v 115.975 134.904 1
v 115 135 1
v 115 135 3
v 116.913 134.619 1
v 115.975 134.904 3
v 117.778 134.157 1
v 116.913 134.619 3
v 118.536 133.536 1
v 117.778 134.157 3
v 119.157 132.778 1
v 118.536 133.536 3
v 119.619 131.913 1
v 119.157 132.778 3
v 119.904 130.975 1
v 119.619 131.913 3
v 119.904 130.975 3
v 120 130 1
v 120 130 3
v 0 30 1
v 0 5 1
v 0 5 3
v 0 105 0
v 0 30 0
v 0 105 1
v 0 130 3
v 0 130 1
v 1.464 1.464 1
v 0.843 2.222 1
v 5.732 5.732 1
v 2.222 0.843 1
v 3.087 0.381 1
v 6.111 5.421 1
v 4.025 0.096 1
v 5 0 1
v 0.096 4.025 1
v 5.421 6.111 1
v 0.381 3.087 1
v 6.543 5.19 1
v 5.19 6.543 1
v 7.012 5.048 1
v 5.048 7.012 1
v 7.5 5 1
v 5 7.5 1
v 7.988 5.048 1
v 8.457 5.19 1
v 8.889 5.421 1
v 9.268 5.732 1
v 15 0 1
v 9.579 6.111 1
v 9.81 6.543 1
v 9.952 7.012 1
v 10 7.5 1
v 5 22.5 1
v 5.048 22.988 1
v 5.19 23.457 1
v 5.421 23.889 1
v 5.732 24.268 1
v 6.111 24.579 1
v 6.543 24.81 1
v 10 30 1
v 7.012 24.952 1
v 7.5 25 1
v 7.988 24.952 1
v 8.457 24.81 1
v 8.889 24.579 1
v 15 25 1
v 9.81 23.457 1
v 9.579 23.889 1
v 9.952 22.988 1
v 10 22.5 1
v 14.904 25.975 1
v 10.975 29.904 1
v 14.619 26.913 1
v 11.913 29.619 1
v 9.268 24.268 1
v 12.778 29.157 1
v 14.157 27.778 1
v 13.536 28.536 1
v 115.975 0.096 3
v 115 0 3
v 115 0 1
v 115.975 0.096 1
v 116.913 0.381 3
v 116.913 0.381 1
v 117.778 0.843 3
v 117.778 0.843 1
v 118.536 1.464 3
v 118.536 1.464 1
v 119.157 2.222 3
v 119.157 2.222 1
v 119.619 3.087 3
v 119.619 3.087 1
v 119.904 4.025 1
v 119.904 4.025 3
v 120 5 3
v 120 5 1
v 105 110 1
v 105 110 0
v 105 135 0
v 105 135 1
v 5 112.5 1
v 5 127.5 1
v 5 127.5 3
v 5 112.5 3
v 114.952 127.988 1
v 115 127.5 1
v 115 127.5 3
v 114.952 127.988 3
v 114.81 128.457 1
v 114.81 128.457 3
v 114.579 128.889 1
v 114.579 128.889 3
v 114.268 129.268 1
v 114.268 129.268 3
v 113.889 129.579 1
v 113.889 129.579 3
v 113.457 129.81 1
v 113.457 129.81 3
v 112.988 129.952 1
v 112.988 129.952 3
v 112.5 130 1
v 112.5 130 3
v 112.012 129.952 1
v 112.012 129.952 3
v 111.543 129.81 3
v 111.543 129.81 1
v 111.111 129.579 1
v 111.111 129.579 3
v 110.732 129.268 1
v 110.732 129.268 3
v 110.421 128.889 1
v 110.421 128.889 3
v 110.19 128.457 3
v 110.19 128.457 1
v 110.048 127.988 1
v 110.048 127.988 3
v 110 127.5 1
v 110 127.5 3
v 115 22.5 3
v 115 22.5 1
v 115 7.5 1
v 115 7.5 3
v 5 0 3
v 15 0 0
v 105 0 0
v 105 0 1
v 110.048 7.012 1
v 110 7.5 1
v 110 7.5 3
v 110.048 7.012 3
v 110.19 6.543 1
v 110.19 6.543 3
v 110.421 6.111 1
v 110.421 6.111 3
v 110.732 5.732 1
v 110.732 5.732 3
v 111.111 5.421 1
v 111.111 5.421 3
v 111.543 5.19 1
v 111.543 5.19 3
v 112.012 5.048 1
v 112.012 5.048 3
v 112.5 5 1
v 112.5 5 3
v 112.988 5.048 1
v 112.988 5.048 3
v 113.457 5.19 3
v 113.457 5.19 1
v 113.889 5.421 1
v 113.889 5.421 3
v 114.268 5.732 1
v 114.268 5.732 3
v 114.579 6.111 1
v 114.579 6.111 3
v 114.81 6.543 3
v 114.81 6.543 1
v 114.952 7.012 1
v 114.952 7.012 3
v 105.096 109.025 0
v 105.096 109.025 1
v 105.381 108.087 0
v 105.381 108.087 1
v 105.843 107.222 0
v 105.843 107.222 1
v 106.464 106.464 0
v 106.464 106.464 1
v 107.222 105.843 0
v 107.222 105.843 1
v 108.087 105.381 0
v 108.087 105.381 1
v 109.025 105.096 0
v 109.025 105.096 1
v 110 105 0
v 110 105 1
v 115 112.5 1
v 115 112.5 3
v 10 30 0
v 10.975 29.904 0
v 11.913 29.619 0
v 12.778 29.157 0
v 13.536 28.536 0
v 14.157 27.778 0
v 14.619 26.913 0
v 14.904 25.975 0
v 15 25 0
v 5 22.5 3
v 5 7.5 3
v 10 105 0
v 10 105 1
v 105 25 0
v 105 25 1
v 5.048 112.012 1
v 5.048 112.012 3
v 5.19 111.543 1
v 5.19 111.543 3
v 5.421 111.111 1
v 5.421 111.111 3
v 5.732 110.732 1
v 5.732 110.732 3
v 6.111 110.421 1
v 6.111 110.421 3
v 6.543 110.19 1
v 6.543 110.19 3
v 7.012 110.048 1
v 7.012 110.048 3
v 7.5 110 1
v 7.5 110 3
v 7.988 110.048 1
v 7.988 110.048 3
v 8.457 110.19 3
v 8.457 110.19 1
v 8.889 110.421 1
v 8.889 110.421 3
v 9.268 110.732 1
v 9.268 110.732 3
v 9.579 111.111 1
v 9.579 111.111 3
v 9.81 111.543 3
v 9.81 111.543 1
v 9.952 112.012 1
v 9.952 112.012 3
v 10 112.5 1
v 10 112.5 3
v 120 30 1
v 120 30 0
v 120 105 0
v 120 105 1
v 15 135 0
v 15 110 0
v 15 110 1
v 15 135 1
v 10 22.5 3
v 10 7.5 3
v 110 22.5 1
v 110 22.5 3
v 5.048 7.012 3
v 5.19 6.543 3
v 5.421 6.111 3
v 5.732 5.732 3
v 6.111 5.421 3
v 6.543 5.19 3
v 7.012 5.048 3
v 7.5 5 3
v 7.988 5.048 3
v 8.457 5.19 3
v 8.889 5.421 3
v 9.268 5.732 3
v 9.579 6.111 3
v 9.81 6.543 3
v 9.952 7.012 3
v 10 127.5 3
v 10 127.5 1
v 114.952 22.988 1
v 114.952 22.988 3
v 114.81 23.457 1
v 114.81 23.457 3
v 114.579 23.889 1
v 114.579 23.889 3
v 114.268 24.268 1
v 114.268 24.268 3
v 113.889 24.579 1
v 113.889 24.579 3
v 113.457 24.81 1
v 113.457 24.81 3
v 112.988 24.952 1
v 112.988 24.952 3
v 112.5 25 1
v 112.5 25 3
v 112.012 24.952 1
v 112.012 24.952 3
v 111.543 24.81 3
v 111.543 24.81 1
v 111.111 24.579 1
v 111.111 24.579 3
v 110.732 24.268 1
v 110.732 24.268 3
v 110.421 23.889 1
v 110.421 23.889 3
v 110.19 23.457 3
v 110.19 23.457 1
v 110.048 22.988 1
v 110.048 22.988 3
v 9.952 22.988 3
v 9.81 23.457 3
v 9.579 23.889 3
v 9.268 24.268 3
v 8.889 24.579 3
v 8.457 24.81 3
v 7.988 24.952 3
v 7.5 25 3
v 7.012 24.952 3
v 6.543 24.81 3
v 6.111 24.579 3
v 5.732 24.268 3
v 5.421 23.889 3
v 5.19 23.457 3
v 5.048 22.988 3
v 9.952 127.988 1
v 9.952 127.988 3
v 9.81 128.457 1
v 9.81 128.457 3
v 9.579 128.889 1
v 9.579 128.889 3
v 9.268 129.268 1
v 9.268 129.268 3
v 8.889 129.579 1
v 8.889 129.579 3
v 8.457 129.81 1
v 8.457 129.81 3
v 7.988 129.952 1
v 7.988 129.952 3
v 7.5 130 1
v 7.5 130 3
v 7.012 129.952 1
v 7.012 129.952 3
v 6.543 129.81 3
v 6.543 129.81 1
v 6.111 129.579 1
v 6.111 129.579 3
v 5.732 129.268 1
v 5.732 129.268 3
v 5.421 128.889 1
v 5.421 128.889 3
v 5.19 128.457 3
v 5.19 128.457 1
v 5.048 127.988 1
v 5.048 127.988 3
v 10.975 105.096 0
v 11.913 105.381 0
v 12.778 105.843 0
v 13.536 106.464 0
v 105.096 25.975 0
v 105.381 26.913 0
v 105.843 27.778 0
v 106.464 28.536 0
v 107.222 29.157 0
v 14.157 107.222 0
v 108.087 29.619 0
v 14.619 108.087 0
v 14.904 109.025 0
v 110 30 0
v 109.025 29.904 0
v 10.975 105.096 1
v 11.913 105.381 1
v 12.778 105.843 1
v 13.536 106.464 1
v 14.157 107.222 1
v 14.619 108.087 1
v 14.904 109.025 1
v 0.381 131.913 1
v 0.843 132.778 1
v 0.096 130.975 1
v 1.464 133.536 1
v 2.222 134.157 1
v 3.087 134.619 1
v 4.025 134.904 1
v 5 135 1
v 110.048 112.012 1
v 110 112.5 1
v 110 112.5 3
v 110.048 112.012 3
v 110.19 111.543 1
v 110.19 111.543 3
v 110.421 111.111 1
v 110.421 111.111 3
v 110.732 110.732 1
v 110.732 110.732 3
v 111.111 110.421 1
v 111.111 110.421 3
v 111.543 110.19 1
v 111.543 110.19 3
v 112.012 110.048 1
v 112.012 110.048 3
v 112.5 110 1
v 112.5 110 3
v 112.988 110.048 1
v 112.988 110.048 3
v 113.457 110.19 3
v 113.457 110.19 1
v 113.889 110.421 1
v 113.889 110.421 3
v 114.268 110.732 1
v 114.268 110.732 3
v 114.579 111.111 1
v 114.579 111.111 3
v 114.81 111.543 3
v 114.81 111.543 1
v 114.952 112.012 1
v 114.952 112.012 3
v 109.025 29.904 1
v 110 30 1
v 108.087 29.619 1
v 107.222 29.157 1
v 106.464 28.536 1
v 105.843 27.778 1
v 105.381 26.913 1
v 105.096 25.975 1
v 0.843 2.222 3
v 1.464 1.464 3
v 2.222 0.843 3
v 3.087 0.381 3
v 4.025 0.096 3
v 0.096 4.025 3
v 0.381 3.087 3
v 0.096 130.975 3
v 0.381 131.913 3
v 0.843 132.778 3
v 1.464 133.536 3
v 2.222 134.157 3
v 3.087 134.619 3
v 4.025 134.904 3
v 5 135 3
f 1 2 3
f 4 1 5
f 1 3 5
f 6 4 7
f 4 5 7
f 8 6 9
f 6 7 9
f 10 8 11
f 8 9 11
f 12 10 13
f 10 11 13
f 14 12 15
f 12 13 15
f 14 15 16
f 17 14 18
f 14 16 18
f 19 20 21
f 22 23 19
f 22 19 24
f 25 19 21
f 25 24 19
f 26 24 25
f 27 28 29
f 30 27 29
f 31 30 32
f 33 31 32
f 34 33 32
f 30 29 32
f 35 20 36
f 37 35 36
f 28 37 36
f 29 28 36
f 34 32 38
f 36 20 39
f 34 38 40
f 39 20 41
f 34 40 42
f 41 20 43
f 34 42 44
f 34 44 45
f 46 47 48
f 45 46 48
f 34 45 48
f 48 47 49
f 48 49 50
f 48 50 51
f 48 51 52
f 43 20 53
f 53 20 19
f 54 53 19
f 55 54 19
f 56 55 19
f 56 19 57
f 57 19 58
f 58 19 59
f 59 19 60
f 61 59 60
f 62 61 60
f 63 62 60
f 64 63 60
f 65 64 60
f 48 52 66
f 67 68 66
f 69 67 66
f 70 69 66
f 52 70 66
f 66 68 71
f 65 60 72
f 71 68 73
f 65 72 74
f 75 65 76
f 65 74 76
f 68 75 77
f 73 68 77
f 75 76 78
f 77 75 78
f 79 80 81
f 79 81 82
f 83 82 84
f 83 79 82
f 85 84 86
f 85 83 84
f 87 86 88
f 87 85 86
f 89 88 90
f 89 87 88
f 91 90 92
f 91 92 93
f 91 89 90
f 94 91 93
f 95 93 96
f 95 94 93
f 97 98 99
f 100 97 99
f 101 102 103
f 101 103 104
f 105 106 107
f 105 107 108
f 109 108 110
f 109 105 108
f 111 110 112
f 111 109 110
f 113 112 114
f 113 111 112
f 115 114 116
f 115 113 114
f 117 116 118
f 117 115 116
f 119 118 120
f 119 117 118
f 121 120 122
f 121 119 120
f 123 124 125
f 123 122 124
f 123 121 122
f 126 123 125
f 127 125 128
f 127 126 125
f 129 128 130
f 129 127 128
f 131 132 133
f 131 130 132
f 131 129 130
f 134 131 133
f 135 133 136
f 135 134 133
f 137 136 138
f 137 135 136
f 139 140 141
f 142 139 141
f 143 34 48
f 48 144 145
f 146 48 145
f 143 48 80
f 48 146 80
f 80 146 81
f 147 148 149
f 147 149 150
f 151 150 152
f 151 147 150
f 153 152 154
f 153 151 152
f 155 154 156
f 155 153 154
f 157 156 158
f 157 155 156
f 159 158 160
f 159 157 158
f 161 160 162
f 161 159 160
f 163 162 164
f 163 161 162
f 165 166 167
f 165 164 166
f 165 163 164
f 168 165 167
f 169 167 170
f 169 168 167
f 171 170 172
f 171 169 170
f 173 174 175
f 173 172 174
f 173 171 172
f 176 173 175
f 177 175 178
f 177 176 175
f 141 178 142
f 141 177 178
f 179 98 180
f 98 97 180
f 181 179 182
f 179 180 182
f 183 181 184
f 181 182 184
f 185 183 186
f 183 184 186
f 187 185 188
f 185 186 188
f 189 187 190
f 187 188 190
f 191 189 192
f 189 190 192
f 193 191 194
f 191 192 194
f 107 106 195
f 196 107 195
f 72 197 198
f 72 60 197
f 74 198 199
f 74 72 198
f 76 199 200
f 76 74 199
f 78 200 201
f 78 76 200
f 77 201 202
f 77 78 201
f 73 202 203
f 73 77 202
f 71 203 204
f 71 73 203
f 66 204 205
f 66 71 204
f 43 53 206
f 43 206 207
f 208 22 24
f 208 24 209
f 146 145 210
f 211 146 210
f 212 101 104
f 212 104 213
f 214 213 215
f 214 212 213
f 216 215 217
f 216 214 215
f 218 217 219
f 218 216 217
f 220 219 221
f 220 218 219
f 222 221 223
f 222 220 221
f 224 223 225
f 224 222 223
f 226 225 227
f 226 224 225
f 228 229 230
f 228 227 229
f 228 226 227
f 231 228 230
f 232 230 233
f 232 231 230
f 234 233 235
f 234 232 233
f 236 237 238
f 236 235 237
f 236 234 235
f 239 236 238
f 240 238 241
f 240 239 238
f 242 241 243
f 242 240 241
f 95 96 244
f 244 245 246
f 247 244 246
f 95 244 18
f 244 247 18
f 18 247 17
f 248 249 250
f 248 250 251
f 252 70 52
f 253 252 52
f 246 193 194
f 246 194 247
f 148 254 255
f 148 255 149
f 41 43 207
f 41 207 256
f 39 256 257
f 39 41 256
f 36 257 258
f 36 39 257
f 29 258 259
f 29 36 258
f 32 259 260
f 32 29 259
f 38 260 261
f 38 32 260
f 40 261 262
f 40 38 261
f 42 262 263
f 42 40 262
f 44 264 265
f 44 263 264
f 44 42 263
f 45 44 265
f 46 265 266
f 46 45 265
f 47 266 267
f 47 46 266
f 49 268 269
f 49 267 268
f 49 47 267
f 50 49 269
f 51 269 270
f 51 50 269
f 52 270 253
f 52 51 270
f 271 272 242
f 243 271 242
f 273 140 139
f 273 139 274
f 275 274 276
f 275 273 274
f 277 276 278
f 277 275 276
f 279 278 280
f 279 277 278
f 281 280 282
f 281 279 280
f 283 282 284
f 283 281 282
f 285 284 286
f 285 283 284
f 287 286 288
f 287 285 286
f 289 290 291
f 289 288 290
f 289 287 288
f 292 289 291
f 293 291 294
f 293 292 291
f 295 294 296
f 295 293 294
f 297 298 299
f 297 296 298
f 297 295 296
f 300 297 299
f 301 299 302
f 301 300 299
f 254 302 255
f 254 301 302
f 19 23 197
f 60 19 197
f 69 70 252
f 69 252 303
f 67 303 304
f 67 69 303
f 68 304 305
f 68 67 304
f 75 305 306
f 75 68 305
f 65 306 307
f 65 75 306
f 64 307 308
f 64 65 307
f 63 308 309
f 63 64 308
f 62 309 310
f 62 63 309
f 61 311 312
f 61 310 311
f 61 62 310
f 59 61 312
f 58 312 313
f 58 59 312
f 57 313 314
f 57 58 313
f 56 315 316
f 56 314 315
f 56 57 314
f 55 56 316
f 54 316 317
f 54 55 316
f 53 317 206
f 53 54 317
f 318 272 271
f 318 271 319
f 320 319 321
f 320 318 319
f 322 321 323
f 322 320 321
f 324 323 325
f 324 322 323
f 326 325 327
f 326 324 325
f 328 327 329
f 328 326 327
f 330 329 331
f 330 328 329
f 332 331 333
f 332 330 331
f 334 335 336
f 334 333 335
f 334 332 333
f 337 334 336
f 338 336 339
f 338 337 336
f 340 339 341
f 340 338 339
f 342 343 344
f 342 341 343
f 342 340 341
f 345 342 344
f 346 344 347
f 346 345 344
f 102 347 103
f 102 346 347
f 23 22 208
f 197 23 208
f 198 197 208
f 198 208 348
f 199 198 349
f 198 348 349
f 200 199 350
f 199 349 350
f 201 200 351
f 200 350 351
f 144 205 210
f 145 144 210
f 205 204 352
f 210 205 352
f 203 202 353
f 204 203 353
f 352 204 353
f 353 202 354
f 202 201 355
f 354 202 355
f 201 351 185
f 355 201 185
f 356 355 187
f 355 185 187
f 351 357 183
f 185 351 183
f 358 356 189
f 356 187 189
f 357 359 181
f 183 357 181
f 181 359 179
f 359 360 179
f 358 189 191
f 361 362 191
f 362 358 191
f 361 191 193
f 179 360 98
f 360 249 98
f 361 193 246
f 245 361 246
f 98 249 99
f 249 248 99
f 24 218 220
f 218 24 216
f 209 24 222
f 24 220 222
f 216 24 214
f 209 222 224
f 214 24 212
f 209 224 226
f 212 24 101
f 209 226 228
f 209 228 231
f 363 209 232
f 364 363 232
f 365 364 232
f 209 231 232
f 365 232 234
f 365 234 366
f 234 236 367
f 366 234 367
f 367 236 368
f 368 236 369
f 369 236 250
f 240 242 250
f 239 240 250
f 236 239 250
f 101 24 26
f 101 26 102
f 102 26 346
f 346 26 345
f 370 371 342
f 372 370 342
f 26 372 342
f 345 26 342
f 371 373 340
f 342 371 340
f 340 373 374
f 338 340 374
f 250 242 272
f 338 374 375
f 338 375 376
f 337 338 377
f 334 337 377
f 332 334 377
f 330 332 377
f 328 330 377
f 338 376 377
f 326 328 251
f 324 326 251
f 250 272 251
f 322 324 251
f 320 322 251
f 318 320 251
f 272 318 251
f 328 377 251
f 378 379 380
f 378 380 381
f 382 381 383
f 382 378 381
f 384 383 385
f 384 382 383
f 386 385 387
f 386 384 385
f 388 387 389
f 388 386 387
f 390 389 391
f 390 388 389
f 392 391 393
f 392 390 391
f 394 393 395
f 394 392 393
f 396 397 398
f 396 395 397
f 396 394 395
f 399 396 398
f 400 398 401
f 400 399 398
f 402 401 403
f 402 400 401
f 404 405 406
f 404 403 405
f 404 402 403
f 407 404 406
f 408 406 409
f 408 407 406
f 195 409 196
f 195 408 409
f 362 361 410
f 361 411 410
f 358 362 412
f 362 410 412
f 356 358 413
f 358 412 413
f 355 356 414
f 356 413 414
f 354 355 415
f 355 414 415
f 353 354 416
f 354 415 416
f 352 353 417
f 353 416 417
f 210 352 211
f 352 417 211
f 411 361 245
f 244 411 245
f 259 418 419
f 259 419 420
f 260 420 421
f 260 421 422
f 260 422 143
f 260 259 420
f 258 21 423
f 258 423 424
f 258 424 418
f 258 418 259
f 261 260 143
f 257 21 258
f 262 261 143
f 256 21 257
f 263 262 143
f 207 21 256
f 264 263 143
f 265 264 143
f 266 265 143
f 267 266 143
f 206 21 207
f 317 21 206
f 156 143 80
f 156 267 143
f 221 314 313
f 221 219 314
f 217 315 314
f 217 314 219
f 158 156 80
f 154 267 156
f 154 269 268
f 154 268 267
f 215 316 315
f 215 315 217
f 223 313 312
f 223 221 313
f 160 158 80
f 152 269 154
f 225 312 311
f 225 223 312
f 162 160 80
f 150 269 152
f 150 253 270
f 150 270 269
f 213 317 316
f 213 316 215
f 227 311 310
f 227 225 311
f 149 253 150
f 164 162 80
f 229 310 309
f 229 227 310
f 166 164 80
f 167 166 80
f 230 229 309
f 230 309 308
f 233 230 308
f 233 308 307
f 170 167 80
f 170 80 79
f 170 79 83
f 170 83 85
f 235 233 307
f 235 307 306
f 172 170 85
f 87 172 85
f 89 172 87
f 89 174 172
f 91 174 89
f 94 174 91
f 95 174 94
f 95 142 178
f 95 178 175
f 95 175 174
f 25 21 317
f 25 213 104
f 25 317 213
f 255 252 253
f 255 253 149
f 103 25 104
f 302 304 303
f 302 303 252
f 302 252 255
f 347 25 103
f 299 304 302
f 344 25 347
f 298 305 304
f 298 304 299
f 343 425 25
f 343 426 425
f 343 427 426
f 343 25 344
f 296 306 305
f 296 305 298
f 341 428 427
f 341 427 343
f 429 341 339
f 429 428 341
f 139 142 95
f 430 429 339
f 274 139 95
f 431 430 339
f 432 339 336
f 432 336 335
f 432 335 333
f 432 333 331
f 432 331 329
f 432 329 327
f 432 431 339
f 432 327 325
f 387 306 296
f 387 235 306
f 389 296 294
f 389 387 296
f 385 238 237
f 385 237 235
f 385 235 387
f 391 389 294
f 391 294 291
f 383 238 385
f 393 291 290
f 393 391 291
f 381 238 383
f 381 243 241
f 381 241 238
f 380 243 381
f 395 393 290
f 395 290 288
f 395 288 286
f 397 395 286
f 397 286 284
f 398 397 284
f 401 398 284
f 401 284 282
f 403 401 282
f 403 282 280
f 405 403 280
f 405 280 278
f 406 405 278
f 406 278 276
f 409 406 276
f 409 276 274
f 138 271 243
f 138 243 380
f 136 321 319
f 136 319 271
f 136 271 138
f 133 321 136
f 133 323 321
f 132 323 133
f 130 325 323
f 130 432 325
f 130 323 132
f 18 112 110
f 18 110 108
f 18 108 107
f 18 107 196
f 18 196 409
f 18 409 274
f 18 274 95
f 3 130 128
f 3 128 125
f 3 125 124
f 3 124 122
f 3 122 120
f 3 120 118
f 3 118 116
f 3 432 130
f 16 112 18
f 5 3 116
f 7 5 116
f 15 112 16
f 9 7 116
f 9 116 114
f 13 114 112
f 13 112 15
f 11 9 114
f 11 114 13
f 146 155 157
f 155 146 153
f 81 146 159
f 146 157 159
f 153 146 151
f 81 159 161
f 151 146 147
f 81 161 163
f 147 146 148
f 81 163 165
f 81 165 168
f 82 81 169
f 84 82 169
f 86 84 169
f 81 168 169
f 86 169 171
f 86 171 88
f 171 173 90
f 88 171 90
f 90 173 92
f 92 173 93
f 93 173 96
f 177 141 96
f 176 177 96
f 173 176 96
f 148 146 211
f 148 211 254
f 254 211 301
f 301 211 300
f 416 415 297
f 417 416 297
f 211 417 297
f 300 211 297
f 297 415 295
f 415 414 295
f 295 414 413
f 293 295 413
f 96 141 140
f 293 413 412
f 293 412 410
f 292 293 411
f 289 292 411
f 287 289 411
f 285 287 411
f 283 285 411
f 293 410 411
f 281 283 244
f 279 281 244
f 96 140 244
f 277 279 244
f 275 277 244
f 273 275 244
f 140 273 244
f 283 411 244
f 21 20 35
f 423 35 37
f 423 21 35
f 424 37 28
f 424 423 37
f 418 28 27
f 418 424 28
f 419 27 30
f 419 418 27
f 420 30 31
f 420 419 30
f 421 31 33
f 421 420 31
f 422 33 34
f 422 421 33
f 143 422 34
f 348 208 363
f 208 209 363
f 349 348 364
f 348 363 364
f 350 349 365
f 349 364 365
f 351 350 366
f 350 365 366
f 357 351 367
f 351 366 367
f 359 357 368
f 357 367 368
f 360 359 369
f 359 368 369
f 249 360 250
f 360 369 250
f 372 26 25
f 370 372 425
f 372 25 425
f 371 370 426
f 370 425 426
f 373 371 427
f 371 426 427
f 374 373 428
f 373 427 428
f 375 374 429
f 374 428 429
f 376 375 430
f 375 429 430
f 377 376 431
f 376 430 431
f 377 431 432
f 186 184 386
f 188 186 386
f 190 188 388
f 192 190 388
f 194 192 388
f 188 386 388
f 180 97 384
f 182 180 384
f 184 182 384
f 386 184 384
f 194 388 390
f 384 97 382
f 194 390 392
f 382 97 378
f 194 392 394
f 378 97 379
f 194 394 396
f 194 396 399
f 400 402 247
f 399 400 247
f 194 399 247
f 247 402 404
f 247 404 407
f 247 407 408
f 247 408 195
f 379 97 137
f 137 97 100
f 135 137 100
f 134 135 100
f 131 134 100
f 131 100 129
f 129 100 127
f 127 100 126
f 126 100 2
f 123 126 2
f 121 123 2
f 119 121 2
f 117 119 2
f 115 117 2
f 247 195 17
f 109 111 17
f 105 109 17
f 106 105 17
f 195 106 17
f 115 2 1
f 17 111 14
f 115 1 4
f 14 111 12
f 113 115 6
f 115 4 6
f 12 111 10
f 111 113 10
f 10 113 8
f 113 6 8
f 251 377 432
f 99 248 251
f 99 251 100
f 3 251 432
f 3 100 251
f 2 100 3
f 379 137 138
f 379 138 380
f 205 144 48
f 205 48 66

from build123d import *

# Parameters (mm, degrees)
SKETCH_W        = 120
SKETCH_H        = 135
PAD_DEPTH       = 3
POCKET_DEPTH    = 5
FILLET_R        = 5
SKETCH002_W     = 15
SKETCH002_H     = 30
POCKET001_DEPTH = 1
FILLET001_R     = 5


with BuildPart() as part:
    # Sketch → Pad (new body)
    with BuildSketch(Plane.XY):
        with Locations((60, 67.5)):
            Rectangle(SKETCH_W, SKETCH_H)
    extrude(amount=PAD_DEPTH)

    # Sketch001 → Pocket (cut)
    with BuildSketch(Plane.XY):
        with BuildLine():
            ThreePointArc((10, 22.5), (7.5, 25), (5, 22.5))
            Line((5, 22.5), (5, 7.5))
            ThreePointArc((5, 7.5), (7.5, 5), (10, 7.5))
            Line((10, 22.5), (10, 7.5))
        make_face()
        with BuildLine():
            ThreePointArc((115, 22.5), (112.5, 25), (110, 22.5))
            Line((110, 22.5), (110, 7.5))
            ThreePointArc((110, 7.5), (112.5, 5), (115, 7.5))
            Line((115, 22.5), (115, 7.5))
        make_face()
        with BuildLine():
            ThreePointArc((10, 127.5), (7.5, 130), (5, 127.5))
            Line((5, 127.5), (5, 112.5))
            ThreePointArc((5, 112.5), (7.5, 110), (10, 112.5))
            Line((10, 127.5), (10, 112.5))
        make_face()
        with BuildLine():
            ThreePointArc((115, 127.5), (112.5, 130), (110, 127.5))
            Line((110, 127.5), (110, 112.5))
            ThreePointArc((110, 112.5), (112.5, 110), (115, 112.5))
            Line((115, 127.5), (115, 112.5))
        make_face()
    extrude(amount=POCKET_DEPTH, mode=Mode.SUBTRACT)

    # Fillet
    fillet_edges = [part.edges().sort_by_distance(p)[0] for p in [
        (120, 0, 1.5),
        (120, 135, 1.5),
        (0, 135, 1.5),
        (0, 0, 1.5),
    ]]
    fillet(fillet_edges, radius=FILLET_R)

    # Sketch002 → Pocket001 (cut)
    with BuildSketch(Plane.XY):
        with Locations((7.5, 15)):
            Rectangle(SKETCH002_W, SKETCH002_H)
        with Locations((7.5, 120)):
            Rectangle(SKETCH002_W, SKETCH002_H)
        with Locations((112.5, 120)):
            Rectangle(SKETCH002_W, SKETCH002_H)
        with Locations((112.5, 15)):
            Rectangle(SKETCH002_W, SKETCH002_H)
    extrude(amount=POCKET001_DEPTH, mode=Mode.SUBTRACT)

    # Fillet001
    fillet001_edges = [part.edges().sort_by_distance(p)[0] for p in [
        (15, 105, 0.5),
        (105, 105, 0.5),
        (105, 30, 0.5),
        (15, 30, 0.5),
    ]]
    fillet(fillet001_edges, radius=FILLET001_R)


solid = part.part
